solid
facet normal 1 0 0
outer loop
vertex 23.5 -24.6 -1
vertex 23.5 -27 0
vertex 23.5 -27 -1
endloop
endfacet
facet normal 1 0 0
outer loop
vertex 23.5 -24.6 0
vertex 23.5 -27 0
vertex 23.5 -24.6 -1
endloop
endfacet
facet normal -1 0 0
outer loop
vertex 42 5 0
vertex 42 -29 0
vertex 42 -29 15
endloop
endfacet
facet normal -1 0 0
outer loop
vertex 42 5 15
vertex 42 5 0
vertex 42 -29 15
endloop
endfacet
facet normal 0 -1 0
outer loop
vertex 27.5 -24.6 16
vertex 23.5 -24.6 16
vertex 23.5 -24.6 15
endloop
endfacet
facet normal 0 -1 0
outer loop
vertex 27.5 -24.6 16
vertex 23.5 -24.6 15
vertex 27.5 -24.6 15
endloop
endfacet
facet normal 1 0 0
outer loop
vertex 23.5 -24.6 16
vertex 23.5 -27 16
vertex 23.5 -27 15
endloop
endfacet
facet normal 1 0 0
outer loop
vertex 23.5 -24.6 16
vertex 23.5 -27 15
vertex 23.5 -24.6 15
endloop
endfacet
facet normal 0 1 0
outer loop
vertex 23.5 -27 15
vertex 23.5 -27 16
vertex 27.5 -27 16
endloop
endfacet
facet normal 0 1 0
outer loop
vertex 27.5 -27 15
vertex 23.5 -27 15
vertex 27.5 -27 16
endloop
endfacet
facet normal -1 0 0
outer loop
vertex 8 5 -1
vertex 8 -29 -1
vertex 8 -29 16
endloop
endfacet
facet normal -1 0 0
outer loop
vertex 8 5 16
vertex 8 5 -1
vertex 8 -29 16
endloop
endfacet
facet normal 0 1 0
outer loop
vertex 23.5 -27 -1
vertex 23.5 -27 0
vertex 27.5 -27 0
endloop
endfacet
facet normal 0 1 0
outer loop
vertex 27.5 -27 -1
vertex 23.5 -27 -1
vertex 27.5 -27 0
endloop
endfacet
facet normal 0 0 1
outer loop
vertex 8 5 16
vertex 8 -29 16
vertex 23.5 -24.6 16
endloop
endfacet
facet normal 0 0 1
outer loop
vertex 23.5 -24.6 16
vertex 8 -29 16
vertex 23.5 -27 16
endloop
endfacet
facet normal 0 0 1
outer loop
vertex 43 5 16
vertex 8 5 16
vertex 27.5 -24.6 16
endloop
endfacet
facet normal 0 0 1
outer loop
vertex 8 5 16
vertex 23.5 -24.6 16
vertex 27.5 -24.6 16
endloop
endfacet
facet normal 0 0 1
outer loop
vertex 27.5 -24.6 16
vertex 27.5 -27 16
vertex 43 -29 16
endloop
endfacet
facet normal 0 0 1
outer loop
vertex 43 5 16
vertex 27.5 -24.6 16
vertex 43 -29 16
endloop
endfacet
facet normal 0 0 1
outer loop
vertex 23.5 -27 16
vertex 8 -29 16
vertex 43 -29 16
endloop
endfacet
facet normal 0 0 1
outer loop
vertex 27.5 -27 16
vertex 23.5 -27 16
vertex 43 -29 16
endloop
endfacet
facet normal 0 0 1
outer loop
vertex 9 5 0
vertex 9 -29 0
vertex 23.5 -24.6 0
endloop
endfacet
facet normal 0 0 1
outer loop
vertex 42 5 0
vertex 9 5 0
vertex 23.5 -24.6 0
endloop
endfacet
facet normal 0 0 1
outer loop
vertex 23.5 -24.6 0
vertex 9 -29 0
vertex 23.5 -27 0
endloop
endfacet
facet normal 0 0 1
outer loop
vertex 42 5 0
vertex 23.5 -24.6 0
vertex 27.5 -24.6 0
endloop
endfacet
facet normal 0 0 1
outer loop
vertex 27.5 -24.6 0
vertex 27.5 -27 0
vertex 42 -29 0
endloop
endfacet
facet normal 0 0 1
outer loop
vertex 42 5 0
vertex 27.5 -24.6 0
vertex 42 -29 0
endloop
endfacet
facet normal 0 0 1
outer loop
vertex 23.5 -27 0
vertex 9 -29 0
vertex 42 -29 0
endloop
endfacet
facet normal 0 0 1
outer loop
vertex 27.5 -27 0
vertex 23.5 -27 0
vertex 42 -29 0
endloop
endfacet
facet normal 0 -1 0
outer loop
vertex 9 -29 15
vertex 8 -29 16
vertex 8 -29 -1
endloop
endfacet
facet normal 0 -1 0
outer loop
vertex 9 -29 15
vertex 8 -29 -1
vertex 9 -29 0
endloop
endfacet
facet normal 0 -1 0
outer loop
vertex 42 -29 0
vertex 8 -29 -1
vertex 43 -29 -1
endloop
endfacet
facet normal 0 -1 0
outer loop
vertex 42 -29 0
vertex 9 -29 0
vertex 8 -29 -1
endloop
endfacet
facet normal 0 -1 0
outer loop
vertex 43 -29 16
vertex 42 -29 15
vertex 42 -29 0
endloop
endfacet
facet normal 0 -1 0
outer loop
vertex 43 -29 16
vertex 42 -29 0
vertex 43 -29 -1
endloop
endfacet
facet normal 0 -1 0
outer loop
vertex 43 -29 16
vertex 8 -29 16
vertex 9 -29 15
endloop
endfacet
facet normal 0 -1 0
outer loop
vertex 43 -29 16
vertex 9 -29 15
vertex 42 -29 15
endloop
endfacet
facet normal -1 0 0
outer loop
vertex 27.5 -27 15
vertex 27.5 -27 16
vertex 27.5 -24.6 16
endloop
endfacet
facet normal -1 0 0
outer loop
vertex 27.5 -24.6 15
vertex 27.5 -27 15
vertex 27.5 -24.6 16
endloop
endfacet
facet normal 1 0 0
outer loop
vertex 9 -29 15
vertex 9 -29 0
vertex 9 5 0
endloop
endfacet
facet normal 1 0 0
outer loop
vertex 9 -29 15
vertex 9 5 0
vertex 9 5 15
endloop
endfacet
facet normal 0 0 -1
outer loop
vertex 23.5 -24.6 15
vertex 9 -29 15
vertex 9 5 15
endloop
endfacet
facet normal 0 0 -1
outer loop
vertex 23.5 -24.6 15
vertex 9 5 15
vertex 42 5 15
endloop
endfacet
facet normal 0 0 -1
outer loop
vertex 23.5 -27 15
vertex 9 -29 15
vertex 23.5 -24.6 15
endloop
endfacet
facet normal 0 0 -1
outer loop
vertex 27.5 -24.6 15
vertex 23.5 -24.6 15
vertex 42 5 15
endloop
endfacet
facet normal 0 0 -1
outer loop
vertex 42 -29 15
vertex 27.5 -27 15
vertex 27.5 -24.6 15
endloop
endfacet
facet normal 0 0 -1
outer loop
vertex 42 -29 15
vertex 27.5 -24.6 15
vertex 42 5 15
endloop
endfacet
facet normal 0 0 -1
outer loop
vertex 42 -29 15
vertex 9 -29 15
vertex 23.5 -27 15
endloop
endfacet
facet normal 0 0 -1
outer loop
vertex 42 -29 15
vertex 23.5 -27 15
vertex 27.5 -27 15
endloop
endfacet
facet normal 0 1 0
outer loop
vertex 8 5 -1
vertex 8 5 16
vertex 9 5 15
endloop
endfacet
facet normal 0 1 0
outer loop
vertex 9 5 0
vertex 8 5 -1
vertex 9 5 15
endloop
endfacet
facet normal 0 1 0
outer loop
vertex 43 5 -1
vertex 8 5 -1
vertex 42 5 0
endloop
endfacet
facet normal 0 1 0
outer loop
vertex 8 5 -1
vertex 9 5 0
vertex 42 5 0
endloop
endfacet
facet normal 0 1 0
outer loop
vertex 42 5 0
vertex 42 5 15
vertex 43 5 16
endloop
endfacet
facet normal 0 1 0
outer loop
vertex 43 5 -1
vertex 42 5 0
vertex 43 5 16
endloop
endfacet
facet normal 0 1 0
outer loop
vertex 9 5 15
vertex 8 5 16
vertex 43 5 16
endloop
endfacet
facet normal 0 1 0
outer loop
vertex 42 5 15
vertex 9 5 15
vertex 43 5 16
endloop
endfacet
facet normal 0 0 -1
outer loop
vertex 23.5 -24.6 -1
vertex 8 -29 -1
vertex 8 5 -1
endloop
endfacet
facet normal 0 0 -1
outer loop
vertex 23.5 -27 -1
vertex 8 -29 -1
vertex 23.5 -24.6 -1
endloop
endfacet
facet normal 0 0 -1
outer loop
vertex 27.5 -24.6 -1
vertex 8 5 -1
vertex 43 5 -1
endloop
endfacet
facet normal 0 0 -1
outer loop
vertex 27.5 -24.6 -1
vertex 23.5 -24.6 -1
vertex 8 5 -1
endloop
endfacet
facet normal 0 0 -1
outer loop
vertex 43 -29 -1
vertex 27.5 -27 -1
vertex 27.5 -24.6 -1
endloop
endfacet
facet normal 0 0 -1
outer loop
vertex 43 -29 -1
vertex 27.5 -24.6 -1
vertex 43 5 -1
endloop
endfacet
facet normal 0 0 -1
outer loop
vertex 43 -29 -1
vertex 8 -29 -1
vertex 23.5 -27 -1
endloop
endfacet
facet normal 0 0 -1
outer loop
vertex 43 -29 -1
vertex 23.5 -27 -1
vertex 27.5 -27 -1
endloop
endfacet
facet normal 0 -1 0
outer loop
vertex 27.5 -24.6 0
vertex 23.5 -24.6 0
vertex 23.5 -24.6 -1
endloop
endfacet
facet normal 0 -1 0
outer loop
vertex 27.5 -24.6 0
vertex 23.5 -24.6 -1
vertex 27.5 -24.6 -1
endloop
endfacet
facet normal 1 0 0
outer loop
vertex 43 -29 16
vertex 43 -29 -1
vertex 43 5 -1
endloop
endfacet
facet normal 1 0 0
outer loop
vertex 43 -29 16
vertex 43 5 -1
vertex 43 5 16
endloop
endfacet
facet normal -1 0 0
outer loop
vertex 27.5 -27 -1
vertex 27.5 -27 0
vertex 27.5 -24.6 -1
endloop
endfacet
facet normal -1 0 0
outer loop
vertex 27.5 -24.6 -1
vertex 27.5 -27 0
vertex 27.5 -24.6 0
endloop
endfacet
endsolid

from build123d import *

# Parameters (mm, degrees)
SKETCH027_W      = 4
SKETCH027_H      = 2.4
EXTRUDE024_DEPTH = 20
SKETCH_W         = 35
SKETCH_H         = 17
SKETCH_W_2       = 33
SKETCH_H_2       = 15
EXTRUDE_DEPTH    = 34


with BuildPart() as extrude024:
    # Sketch027 → Extrude024 (new body)
    with BuildSketch(Plane.XY.offset(18)):
        with Locations((25.5, -25.8)):
            Rectangle(SKETCH027_W, SKETCH027_H)
    extrude(amount=-EXTRUDE024_DEPTH)


with BuildPart() as cut001:
    # Sketch → Extrude (new body)
    with BuildSketch(Plane.XZ.offset(29)):
        with Locations((25.5, 7.5)):
            Rectangle(SKETCH_W, SKETCH_H)
        with Locations((25.5, 7.5)):
            Rectangle(SKETCH_W_2, SKETCH_H_2, mode=Mode.SUBTRACT)
    extrude(amount=-EXTRUDE_DEPTH)

    # Cut001: cut Extrude024
    add(extrude024.part, mode=Mode.SUBTRACT)


solid = cut001.part
